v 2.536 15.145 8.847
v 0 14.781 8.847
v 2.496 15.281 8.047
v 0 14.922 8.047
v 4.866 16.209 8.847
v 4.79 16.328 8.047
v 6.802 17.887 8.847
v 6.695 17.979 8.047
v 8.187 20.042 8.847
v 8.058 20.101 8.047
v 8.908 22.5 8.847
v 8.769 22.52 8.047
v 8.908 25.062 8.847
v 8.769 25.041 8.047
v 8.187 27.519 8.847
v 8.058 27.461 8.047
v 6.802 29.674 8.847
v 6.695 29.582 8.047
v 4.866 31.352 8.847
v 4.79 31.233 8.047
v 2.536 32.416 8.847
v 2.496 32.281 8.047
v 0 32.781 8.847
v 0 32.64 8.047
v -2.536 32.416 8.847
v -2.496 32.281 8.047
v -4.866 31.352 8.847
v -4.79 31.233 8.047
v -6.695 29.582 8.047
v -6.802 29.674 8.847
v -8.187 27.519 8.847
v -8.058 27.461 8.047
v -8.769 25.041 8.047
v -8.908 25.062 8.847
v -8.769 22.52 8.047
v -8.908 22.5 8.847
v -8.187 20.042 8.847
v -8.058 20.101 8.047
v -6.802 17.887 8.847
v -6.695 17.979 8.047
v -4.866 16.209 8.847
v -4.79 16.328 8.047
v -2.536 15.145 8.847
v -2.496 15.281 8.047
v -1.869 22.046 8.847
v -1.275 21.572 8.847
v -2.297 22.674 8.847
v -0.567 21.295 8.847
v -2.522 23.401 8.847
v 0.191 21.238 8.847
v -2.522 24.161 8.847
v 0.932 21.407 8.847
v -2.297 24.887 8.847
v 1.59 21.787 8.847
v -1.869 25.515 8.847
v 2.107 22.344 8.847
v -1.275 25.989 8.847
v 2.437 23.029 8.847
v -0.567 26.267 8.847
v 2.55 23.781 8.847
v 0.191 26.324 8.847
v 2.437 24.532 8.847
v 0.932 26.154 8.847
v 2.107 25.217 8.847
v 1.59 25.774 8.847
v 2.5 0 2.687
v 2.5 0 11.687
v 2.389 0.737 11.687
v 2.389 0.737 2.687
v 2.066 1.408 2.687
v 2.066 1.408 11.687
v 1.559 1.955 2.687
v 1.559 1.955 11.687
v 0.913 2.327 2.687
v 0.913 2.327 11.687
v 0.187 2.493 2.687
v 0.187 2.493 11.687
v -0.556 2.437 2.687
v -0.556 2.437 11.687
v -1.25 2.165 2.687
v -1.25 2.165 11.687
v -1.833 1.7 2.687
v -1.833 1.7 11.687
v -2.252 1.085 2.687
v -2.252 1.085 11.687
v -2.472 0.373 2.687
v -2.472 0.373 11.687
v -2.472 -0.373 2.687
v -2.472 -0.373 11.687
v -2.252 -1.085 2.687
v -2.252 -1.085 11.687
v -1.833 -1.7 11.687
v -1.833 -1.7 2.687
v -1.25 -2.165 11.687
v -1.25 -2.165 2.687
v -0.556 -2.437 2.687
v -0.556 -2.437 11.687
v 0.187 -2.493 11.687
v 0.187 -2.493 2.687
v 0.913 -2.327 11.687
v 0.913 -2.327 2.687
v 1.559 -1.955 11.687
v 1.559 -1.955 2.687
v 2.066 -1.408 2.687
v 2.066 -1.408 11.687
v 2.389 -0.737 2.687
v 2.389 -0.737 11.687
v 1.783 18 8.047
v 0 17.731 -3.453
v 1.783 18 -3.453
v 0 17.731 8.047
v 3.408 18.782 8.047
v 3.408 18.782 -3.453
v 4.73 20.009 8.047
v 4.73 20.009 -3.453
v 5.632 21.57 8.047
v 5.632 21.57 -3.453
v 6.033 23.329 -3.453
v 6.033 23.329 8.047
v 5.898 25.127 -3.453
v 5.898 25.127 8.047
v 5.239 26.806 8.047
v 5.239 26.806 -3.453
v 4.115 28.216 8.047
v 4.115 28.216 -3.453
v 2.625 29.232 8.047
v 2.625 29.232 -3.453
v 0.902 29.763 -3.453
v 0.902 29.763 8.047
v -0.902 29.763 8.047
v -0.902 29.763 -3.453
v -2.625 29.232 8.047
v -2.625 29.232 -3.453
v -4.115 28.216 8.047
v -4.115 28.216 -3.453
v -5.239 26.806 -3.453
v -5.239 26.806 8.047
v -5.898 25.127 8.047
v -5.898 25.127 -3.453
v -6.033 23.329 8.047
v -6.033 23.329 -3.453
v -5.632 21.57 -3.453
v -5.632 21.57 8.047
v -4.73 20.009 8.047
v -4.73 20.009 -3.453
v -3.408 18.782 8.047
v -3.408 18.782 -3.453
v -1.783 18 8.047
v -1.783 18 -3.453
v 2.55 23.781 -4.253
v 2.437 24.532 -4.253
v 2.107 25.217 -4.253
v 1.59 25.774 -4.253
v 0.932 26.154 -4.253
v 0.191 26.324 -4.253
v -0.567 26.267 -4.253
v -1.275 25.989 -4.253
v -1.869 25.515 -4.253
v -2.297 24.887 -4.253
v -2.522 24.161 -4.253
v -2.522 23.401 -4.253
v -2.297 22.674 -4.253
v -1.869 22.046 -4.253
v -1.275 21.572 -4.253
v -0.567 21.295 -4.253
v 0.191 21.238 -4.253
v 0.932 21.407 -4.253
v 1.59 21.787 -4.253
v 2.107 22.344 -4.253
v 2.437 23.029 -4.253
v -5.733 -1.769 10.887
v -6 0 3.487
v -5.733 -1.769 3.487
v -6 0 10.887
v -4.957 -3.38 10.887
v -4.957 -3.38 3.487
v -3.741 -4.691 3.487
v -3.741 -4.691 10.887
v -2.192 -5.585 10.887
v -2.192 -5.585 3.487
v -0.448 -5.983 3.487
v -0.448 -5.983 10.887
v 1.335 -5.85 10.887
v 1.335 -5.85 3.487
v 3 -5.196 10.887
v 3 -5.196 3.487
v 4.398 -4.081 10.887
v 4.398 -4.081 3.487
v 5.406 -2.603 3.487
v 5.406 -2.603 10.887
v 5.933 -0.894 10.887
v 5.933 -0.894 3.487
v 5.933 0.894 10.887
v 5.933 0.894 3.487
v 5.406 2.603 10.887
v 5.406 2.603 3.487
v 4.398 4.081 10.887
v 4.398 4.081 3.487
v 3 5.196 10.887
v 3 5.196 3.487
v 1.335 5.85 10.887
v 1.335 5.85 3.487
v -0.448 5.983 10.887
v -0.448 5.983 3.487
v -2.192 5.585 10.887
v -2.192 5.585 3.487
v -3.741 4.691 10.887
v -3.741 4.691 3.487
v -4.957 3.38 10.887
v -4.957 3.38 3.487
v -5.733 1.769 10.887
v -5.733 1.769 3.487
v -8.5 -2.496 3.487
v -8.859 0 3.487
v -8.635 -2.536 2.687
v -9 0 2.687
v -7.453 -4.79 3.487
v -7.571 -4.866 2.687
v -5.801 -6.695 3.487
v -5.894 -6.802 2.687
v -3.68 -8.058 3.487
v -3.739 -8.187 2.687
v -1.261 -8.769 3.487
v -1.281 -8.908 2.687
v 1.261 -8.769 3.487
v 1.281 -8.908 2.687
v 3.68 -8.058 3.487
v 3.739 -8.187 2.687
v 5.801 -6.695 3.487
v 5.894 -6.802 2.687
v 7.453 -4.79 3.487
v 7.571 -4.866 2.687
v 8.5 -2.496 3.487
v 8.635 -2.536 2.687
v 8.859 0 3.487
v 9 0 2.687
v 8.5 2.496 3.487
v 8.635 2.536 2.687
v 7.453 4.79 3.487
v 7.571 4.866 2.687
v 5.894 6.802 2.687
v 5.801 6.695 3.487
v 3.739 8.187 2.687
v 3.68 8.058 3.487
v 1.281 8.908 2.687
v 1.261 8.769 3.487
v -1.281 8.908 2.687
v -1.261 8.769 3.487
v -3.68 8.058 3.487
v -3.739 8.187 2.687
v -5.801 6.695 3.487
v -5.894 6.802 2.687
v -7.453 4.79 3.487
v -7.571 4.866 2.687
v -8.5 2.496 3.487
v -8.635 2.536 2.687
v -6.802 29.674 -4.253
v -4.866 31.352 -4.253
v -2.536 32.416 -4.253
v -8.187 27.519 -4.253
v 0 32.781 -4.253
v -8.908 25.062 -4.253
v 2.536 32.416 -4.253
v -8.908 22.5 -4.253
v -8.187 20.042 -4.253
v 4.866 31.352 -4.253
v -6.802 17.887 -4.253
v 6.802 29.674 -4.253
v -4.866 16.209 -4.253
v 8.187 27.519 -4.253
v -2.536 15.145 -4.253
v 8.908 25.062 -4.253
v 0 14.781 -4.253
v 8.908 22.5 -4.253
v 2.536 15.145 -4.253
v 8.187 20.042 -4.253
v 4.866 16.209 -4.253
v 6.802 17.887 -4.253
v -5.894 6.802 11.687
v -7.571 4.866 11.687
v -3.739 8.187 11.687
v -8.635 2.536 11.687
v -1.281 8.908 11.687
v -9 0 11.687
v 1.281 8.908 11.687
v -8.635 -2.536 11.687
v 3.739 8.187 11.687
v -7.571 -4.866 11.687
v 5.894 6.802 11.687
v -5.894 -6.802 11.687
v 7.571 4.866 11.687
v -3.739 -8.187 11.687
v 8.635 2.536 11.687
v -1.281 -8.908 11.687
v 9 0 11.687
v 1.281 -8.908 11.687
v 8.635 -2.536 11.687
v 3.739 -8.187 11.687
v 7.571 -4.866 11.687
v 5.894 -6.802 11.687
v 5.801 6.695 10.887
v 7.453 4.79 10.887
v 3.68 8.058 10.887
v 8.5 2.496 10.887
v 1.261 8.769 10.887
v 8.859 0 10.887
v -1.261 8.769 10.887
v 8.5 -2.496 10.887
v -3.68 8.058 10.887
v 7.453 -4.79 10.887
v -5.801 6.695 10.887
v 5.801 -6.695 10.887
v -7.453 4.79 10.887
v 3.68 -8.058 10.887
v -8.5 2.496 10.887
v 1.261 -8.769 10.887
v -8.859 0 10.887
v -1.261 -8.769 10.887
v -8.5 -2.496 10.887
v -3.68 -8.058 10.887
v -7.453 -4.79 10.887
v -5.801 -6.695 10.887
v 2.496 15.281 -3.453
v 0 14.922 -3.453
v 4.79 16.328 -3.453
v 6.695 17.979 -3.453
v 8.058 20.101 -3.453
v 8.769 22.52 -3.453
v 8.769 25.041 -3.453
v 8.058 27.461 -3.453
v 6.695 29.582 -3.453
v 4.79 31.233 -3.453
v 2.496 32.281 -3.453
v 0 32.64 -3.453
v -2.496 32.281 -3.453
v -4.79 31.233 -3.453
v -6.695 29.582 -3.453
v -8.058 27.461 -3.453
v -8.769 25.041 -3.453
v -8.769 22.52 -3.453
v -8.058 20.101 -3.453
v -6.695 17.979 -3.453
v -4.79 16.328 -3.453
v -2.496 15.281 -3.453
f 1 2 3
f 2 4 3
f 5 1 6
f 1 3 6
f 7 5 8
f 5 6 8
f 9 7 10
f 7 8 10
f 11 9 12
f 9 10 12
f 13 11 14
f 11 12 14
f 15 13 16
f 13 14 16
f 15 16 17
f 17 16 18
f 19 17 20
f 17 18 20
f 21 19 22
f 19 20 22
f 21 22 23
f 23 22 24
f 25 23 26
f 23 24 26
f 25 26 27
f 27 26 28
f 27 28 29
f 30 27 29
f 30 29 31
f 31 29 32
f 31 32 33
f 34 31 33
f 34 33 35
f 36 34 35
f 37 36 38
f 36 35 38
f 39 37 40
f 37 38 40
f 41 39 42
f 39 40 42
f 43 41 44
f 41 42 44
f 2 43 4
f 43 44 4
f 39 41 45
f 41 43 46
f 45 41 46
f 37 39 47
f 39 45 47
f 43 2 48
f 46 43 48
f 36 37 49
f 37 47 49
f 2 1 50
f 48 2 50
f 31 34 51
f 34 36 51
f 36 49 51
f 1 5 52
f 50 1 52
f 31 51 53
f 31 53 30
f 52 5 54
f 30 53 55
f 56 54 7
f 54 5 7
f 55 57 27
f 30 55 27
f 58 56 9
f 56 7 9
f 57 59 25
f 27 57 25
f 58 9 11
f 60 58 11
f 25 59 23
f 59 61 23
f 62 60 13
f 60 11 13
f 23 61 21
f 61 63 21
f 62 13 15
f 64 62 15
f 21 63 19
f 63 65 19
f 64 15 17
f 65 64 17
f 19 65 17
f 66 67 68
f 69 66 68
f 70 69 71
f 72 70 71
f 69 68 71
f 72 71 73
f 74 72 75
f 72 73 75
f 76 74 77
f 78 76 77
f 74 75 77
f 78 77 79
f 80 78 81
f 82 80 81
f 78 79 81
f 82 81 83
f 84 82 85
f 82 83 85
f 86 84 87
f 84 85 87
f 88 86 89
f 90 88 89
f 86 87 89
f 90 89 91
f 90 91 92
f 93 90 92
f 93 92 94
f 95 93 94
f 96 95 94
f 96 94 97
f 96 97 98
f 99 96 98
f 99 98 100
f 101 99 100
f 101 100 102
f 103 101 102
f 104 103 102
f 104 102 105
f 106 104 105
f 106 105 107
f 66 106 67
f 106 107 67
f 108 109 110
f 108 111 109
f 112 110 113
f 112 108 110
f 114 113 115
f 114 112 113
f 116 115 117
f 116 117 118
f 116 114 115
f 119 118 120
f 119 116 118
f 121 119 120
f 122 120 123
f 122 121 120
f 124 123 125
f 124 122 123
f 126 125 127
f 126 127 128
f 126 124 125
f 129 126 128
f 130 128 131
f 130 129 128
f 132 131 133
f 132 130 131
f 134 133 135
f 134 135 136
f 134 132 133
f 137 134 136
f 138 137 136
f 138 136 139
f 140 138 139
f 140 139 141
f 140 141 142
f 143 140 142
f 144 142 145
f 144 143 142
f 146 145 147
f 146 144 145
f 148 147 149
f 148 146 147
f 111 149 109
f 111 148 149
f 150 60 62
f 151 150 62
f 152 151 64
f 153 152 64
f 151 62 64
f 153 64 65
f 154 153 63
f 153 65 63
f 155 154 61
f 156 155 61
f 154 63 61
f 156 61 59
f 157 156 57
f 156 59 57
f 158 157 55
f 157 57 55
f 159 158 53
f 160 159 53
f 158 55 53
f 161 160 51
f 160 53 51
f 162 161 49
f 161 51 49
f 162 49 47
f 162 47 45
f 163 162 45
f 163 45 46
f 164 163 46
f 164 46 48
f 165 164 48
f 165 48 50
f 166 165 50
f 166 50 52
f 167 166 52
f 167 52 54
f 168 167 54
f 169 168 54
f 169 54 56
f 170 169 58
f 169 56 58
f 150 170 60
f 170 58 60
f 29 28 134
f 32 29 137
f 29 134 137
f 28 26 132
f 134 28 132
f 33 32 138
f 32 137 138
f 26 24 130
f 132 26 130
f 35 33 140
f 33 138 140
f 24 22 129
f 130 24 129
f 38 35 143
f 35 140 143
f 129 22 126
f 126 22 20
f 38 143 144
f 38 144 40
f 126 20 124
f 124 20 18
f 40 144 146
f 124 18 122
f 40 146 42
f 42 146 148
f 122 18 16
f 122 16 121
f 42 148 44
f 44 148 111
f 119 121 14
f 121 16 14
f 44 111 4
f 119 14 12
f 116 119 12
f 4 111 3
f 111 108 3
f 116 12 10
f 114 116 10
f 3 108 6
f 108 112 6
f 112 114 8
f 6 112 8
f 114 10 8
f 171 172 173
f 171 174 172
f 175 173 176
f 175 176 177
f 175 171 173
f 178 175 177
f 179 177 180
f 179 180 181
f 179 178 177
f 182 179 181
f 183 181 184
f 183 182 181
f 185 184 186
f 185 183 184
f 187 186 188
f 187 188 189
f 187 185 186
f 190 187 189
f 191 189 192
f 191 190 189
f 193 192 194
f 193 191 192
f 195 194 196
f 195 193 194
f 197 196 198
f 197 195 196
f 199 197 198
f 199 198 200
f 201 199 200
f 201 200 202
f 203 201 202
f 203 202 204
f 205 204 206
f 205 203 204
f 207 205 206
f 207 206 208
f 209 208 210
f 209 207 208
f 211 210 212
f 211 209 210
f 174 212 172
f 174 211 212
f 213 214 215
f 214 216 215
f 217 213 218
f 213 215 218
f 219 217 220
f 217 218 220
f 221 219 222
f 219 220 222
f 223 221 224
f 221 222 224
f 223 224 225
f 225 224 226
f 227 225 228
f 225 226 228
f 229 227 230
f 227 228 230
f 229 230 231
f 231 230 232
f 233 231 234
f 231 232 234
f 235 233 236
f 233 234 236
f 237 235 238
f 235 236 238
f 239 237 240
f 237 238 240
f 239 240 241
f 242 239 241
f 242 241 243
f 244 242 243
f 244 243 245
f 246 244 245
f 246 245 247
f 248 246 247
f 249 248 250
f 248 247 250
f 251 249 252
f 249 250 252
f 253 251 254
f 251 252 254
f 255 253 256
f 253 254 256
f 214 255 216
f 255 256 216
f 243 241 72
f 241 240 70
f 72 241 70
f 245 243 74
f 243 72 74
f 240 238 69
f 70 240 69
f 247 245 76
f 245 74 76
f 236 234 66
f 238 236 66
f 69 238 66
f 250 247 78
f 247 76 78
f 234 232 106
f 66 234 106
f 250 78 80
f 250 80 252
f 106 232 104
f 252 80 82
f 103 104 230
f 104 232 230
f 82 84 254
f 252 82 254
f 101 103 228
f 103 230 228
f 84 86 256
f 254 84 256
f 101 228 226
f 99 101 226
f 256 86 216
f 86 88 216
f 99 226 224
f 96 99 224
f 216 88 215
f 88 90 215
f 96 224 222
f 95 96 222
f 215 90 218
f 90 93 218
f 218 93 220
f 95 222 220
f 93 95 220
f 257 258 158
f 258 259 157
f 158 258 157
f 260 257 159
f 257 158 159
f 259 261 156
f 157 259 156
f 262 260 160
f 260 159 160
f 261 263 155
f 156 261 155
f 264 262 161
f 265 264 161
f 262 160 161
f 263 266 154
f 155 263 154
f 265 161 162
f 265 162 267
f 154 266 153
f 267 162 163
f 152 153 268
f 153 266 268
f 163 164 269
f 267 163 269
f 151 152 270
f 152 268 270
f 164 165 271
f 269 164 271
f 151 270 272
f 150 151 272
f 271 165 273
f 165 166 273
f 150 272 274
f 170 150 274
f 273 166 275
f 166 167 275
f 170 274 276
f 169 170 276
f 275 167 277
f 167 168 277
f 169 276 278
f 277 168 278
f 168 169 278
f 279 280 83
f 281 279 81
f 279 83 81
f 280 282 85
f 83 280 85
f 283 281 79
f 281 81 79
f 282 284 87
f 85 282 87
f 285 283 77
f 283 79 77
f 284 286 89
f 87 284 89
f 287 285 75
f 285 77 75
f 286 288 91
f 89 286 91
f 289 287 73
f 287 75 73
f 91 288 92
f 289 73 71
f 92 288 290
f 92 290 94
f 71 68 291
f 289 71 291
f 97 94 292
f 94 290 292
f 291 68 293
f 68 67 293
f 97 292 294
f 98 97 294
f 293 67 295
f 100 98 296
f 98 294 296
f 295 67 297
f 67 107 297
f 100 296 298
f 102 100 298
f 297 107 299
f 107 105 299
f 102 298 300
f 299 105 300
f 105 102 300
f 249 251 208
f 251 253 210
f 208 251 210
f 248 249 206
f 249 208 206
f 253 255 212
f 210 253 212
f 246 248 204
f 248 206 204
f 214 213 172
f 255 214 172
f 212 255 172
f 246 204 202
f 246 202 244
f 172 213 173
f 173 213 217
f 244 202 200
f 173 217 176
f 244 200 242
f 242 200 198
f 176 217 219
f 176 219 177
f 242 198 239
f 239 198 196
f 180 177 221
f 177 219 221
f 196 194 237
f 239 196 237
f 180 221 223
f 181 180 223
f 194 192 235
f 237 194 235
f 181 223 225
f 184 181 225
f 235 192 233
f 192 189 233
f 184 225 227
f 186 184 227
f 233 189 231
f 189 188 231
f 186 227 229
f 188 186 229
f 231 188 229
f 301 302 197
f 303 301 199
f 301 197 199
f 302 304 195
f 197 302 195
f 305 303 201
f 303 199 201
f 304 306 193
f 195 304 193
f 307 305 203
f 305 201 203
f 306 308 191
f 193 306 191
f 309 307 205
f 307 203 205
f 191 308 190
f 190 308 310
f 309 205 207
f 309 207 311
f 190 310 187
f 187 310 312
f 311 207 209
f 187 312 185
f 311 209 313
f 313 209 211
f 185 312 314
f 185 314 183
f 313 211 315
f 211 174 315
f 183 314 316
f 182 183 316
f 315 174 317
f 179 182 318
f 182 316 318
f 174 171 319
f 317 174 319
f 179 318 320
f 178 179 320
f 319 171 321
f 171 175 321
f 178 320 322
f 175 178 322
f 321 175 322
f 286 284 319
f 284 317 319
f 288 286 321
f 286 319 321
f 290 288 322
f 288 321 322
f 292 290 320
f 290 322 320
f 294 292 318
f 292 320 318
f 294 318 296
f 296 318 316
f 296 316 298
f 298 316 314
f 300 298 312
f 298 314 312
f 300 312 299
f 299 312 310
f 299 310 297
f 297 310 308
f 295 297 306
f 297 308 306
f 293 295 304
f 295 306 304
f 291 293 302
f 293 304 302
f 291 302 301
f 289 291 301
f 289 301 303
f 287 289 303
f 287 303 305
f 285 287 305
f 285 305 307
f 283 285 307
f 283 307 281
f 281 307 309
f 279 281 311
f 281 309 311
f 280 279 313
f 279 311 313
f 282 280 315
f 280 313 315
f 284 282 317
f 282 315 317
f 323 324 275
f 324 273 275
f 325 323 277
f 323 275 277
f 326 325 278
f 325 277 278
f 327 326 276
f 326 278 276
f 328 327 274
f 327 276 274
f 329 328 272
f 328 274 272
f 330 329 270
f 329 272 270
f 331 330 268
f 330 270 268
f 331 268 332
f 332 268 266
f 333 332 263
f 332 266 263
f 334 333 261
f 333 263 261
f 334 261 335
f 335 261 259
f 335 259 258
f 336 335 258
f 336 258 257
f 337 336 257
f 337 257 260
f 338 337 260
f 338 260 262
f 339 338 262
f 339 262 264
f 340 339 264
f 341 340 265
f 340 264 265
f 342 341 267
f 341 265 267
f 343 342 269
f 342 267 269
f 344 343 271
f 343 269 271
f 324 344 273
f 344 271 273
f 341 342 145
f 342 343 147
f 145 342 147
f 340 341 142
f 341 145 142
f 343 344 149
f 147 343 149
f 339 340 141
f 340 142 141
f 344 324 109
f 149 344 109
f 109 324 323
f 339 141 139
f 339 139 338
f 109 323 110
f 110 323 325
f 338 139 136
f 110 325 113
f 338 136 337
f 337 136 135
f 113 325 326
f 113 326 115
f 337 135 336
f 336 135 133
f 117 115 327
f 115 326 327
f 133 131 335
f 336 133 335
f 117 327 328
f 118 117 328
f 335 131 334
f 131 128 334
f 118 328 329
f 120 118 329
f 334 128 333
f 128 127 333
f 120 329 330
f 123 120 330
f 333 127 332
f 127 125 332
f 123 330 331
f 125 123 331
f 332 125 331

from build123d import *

# Parameters (mm, degrees)
F0_W     = 6
F0_H     = 7.4
F2_R     = 2.5
F3_DEPTH = 9
F4_W     = 6.05
F4_H     = 11.5
F6_R     = 2.55
F7_DEPTH = 13.1


with BuildPart() as f1:
    # F0 (on Front) → F1 (revolve)
    with BuildSketch(Plane.XZ):
        Polygon((0, 11.687311), (-9, 11.687311), (-8.858938, 10.887311), (-6, 10.887311), (0, 10.887311), align=None)
        with Locations((-3, 7.187311)):
            Rectangle(F0_W, F0_H)
        Polygon((0, 2.687311), (0, 3.487311), (-6, 3.487311), (-8.858938, 3.487311), (-9, 2.687311), align=None)
    revolve(axis=Axis((0, 0, 3.487311), (0, 0, 1)))

    # F2 (on face) → F3 (cut, through all)
    with BuildSketch(Plane.XY.offset(11.687311)):
        Circle(F2_R)
    extrude(amount=-F3_DEPTH, mode=Mode.SUBTRACT)


with BuildPart() as f5:
    # F4 (on Right) → F5 (revolve)
    with BuildSketch(Plane.YZ):
        Polygon((23.780716, -4.253333), (23.780716, -3.453333), (17.730716, -3.453333), (14.921778, -3.453333), (14.780716, -4.253333), align=None)
        with Locations((20.755716, 2.296667)):
            Rectangle(F4_W, F4_H)
        Polygon((23.780716, 8.846667), (14.780716, 8.846667), (14.921778, 8.046667), (17.730716, 8.046667), (23.780716, 8.046667), align=None)
    revolve(axis=Axis((0, 23.780716, -3.453333), (0, 0, 1)))

    # F6 (on face) → F7 (cut, through all)
    with BuildSketch(Plane.XY.offset(8.846667)):
        with Locations((0, 23.780716)):
            Circle(F6_R)
    extrude(amount=-F7_DEPTH, mode=Mode.SUBTRACT)


solid = Compound([f1.part, f5.part])
